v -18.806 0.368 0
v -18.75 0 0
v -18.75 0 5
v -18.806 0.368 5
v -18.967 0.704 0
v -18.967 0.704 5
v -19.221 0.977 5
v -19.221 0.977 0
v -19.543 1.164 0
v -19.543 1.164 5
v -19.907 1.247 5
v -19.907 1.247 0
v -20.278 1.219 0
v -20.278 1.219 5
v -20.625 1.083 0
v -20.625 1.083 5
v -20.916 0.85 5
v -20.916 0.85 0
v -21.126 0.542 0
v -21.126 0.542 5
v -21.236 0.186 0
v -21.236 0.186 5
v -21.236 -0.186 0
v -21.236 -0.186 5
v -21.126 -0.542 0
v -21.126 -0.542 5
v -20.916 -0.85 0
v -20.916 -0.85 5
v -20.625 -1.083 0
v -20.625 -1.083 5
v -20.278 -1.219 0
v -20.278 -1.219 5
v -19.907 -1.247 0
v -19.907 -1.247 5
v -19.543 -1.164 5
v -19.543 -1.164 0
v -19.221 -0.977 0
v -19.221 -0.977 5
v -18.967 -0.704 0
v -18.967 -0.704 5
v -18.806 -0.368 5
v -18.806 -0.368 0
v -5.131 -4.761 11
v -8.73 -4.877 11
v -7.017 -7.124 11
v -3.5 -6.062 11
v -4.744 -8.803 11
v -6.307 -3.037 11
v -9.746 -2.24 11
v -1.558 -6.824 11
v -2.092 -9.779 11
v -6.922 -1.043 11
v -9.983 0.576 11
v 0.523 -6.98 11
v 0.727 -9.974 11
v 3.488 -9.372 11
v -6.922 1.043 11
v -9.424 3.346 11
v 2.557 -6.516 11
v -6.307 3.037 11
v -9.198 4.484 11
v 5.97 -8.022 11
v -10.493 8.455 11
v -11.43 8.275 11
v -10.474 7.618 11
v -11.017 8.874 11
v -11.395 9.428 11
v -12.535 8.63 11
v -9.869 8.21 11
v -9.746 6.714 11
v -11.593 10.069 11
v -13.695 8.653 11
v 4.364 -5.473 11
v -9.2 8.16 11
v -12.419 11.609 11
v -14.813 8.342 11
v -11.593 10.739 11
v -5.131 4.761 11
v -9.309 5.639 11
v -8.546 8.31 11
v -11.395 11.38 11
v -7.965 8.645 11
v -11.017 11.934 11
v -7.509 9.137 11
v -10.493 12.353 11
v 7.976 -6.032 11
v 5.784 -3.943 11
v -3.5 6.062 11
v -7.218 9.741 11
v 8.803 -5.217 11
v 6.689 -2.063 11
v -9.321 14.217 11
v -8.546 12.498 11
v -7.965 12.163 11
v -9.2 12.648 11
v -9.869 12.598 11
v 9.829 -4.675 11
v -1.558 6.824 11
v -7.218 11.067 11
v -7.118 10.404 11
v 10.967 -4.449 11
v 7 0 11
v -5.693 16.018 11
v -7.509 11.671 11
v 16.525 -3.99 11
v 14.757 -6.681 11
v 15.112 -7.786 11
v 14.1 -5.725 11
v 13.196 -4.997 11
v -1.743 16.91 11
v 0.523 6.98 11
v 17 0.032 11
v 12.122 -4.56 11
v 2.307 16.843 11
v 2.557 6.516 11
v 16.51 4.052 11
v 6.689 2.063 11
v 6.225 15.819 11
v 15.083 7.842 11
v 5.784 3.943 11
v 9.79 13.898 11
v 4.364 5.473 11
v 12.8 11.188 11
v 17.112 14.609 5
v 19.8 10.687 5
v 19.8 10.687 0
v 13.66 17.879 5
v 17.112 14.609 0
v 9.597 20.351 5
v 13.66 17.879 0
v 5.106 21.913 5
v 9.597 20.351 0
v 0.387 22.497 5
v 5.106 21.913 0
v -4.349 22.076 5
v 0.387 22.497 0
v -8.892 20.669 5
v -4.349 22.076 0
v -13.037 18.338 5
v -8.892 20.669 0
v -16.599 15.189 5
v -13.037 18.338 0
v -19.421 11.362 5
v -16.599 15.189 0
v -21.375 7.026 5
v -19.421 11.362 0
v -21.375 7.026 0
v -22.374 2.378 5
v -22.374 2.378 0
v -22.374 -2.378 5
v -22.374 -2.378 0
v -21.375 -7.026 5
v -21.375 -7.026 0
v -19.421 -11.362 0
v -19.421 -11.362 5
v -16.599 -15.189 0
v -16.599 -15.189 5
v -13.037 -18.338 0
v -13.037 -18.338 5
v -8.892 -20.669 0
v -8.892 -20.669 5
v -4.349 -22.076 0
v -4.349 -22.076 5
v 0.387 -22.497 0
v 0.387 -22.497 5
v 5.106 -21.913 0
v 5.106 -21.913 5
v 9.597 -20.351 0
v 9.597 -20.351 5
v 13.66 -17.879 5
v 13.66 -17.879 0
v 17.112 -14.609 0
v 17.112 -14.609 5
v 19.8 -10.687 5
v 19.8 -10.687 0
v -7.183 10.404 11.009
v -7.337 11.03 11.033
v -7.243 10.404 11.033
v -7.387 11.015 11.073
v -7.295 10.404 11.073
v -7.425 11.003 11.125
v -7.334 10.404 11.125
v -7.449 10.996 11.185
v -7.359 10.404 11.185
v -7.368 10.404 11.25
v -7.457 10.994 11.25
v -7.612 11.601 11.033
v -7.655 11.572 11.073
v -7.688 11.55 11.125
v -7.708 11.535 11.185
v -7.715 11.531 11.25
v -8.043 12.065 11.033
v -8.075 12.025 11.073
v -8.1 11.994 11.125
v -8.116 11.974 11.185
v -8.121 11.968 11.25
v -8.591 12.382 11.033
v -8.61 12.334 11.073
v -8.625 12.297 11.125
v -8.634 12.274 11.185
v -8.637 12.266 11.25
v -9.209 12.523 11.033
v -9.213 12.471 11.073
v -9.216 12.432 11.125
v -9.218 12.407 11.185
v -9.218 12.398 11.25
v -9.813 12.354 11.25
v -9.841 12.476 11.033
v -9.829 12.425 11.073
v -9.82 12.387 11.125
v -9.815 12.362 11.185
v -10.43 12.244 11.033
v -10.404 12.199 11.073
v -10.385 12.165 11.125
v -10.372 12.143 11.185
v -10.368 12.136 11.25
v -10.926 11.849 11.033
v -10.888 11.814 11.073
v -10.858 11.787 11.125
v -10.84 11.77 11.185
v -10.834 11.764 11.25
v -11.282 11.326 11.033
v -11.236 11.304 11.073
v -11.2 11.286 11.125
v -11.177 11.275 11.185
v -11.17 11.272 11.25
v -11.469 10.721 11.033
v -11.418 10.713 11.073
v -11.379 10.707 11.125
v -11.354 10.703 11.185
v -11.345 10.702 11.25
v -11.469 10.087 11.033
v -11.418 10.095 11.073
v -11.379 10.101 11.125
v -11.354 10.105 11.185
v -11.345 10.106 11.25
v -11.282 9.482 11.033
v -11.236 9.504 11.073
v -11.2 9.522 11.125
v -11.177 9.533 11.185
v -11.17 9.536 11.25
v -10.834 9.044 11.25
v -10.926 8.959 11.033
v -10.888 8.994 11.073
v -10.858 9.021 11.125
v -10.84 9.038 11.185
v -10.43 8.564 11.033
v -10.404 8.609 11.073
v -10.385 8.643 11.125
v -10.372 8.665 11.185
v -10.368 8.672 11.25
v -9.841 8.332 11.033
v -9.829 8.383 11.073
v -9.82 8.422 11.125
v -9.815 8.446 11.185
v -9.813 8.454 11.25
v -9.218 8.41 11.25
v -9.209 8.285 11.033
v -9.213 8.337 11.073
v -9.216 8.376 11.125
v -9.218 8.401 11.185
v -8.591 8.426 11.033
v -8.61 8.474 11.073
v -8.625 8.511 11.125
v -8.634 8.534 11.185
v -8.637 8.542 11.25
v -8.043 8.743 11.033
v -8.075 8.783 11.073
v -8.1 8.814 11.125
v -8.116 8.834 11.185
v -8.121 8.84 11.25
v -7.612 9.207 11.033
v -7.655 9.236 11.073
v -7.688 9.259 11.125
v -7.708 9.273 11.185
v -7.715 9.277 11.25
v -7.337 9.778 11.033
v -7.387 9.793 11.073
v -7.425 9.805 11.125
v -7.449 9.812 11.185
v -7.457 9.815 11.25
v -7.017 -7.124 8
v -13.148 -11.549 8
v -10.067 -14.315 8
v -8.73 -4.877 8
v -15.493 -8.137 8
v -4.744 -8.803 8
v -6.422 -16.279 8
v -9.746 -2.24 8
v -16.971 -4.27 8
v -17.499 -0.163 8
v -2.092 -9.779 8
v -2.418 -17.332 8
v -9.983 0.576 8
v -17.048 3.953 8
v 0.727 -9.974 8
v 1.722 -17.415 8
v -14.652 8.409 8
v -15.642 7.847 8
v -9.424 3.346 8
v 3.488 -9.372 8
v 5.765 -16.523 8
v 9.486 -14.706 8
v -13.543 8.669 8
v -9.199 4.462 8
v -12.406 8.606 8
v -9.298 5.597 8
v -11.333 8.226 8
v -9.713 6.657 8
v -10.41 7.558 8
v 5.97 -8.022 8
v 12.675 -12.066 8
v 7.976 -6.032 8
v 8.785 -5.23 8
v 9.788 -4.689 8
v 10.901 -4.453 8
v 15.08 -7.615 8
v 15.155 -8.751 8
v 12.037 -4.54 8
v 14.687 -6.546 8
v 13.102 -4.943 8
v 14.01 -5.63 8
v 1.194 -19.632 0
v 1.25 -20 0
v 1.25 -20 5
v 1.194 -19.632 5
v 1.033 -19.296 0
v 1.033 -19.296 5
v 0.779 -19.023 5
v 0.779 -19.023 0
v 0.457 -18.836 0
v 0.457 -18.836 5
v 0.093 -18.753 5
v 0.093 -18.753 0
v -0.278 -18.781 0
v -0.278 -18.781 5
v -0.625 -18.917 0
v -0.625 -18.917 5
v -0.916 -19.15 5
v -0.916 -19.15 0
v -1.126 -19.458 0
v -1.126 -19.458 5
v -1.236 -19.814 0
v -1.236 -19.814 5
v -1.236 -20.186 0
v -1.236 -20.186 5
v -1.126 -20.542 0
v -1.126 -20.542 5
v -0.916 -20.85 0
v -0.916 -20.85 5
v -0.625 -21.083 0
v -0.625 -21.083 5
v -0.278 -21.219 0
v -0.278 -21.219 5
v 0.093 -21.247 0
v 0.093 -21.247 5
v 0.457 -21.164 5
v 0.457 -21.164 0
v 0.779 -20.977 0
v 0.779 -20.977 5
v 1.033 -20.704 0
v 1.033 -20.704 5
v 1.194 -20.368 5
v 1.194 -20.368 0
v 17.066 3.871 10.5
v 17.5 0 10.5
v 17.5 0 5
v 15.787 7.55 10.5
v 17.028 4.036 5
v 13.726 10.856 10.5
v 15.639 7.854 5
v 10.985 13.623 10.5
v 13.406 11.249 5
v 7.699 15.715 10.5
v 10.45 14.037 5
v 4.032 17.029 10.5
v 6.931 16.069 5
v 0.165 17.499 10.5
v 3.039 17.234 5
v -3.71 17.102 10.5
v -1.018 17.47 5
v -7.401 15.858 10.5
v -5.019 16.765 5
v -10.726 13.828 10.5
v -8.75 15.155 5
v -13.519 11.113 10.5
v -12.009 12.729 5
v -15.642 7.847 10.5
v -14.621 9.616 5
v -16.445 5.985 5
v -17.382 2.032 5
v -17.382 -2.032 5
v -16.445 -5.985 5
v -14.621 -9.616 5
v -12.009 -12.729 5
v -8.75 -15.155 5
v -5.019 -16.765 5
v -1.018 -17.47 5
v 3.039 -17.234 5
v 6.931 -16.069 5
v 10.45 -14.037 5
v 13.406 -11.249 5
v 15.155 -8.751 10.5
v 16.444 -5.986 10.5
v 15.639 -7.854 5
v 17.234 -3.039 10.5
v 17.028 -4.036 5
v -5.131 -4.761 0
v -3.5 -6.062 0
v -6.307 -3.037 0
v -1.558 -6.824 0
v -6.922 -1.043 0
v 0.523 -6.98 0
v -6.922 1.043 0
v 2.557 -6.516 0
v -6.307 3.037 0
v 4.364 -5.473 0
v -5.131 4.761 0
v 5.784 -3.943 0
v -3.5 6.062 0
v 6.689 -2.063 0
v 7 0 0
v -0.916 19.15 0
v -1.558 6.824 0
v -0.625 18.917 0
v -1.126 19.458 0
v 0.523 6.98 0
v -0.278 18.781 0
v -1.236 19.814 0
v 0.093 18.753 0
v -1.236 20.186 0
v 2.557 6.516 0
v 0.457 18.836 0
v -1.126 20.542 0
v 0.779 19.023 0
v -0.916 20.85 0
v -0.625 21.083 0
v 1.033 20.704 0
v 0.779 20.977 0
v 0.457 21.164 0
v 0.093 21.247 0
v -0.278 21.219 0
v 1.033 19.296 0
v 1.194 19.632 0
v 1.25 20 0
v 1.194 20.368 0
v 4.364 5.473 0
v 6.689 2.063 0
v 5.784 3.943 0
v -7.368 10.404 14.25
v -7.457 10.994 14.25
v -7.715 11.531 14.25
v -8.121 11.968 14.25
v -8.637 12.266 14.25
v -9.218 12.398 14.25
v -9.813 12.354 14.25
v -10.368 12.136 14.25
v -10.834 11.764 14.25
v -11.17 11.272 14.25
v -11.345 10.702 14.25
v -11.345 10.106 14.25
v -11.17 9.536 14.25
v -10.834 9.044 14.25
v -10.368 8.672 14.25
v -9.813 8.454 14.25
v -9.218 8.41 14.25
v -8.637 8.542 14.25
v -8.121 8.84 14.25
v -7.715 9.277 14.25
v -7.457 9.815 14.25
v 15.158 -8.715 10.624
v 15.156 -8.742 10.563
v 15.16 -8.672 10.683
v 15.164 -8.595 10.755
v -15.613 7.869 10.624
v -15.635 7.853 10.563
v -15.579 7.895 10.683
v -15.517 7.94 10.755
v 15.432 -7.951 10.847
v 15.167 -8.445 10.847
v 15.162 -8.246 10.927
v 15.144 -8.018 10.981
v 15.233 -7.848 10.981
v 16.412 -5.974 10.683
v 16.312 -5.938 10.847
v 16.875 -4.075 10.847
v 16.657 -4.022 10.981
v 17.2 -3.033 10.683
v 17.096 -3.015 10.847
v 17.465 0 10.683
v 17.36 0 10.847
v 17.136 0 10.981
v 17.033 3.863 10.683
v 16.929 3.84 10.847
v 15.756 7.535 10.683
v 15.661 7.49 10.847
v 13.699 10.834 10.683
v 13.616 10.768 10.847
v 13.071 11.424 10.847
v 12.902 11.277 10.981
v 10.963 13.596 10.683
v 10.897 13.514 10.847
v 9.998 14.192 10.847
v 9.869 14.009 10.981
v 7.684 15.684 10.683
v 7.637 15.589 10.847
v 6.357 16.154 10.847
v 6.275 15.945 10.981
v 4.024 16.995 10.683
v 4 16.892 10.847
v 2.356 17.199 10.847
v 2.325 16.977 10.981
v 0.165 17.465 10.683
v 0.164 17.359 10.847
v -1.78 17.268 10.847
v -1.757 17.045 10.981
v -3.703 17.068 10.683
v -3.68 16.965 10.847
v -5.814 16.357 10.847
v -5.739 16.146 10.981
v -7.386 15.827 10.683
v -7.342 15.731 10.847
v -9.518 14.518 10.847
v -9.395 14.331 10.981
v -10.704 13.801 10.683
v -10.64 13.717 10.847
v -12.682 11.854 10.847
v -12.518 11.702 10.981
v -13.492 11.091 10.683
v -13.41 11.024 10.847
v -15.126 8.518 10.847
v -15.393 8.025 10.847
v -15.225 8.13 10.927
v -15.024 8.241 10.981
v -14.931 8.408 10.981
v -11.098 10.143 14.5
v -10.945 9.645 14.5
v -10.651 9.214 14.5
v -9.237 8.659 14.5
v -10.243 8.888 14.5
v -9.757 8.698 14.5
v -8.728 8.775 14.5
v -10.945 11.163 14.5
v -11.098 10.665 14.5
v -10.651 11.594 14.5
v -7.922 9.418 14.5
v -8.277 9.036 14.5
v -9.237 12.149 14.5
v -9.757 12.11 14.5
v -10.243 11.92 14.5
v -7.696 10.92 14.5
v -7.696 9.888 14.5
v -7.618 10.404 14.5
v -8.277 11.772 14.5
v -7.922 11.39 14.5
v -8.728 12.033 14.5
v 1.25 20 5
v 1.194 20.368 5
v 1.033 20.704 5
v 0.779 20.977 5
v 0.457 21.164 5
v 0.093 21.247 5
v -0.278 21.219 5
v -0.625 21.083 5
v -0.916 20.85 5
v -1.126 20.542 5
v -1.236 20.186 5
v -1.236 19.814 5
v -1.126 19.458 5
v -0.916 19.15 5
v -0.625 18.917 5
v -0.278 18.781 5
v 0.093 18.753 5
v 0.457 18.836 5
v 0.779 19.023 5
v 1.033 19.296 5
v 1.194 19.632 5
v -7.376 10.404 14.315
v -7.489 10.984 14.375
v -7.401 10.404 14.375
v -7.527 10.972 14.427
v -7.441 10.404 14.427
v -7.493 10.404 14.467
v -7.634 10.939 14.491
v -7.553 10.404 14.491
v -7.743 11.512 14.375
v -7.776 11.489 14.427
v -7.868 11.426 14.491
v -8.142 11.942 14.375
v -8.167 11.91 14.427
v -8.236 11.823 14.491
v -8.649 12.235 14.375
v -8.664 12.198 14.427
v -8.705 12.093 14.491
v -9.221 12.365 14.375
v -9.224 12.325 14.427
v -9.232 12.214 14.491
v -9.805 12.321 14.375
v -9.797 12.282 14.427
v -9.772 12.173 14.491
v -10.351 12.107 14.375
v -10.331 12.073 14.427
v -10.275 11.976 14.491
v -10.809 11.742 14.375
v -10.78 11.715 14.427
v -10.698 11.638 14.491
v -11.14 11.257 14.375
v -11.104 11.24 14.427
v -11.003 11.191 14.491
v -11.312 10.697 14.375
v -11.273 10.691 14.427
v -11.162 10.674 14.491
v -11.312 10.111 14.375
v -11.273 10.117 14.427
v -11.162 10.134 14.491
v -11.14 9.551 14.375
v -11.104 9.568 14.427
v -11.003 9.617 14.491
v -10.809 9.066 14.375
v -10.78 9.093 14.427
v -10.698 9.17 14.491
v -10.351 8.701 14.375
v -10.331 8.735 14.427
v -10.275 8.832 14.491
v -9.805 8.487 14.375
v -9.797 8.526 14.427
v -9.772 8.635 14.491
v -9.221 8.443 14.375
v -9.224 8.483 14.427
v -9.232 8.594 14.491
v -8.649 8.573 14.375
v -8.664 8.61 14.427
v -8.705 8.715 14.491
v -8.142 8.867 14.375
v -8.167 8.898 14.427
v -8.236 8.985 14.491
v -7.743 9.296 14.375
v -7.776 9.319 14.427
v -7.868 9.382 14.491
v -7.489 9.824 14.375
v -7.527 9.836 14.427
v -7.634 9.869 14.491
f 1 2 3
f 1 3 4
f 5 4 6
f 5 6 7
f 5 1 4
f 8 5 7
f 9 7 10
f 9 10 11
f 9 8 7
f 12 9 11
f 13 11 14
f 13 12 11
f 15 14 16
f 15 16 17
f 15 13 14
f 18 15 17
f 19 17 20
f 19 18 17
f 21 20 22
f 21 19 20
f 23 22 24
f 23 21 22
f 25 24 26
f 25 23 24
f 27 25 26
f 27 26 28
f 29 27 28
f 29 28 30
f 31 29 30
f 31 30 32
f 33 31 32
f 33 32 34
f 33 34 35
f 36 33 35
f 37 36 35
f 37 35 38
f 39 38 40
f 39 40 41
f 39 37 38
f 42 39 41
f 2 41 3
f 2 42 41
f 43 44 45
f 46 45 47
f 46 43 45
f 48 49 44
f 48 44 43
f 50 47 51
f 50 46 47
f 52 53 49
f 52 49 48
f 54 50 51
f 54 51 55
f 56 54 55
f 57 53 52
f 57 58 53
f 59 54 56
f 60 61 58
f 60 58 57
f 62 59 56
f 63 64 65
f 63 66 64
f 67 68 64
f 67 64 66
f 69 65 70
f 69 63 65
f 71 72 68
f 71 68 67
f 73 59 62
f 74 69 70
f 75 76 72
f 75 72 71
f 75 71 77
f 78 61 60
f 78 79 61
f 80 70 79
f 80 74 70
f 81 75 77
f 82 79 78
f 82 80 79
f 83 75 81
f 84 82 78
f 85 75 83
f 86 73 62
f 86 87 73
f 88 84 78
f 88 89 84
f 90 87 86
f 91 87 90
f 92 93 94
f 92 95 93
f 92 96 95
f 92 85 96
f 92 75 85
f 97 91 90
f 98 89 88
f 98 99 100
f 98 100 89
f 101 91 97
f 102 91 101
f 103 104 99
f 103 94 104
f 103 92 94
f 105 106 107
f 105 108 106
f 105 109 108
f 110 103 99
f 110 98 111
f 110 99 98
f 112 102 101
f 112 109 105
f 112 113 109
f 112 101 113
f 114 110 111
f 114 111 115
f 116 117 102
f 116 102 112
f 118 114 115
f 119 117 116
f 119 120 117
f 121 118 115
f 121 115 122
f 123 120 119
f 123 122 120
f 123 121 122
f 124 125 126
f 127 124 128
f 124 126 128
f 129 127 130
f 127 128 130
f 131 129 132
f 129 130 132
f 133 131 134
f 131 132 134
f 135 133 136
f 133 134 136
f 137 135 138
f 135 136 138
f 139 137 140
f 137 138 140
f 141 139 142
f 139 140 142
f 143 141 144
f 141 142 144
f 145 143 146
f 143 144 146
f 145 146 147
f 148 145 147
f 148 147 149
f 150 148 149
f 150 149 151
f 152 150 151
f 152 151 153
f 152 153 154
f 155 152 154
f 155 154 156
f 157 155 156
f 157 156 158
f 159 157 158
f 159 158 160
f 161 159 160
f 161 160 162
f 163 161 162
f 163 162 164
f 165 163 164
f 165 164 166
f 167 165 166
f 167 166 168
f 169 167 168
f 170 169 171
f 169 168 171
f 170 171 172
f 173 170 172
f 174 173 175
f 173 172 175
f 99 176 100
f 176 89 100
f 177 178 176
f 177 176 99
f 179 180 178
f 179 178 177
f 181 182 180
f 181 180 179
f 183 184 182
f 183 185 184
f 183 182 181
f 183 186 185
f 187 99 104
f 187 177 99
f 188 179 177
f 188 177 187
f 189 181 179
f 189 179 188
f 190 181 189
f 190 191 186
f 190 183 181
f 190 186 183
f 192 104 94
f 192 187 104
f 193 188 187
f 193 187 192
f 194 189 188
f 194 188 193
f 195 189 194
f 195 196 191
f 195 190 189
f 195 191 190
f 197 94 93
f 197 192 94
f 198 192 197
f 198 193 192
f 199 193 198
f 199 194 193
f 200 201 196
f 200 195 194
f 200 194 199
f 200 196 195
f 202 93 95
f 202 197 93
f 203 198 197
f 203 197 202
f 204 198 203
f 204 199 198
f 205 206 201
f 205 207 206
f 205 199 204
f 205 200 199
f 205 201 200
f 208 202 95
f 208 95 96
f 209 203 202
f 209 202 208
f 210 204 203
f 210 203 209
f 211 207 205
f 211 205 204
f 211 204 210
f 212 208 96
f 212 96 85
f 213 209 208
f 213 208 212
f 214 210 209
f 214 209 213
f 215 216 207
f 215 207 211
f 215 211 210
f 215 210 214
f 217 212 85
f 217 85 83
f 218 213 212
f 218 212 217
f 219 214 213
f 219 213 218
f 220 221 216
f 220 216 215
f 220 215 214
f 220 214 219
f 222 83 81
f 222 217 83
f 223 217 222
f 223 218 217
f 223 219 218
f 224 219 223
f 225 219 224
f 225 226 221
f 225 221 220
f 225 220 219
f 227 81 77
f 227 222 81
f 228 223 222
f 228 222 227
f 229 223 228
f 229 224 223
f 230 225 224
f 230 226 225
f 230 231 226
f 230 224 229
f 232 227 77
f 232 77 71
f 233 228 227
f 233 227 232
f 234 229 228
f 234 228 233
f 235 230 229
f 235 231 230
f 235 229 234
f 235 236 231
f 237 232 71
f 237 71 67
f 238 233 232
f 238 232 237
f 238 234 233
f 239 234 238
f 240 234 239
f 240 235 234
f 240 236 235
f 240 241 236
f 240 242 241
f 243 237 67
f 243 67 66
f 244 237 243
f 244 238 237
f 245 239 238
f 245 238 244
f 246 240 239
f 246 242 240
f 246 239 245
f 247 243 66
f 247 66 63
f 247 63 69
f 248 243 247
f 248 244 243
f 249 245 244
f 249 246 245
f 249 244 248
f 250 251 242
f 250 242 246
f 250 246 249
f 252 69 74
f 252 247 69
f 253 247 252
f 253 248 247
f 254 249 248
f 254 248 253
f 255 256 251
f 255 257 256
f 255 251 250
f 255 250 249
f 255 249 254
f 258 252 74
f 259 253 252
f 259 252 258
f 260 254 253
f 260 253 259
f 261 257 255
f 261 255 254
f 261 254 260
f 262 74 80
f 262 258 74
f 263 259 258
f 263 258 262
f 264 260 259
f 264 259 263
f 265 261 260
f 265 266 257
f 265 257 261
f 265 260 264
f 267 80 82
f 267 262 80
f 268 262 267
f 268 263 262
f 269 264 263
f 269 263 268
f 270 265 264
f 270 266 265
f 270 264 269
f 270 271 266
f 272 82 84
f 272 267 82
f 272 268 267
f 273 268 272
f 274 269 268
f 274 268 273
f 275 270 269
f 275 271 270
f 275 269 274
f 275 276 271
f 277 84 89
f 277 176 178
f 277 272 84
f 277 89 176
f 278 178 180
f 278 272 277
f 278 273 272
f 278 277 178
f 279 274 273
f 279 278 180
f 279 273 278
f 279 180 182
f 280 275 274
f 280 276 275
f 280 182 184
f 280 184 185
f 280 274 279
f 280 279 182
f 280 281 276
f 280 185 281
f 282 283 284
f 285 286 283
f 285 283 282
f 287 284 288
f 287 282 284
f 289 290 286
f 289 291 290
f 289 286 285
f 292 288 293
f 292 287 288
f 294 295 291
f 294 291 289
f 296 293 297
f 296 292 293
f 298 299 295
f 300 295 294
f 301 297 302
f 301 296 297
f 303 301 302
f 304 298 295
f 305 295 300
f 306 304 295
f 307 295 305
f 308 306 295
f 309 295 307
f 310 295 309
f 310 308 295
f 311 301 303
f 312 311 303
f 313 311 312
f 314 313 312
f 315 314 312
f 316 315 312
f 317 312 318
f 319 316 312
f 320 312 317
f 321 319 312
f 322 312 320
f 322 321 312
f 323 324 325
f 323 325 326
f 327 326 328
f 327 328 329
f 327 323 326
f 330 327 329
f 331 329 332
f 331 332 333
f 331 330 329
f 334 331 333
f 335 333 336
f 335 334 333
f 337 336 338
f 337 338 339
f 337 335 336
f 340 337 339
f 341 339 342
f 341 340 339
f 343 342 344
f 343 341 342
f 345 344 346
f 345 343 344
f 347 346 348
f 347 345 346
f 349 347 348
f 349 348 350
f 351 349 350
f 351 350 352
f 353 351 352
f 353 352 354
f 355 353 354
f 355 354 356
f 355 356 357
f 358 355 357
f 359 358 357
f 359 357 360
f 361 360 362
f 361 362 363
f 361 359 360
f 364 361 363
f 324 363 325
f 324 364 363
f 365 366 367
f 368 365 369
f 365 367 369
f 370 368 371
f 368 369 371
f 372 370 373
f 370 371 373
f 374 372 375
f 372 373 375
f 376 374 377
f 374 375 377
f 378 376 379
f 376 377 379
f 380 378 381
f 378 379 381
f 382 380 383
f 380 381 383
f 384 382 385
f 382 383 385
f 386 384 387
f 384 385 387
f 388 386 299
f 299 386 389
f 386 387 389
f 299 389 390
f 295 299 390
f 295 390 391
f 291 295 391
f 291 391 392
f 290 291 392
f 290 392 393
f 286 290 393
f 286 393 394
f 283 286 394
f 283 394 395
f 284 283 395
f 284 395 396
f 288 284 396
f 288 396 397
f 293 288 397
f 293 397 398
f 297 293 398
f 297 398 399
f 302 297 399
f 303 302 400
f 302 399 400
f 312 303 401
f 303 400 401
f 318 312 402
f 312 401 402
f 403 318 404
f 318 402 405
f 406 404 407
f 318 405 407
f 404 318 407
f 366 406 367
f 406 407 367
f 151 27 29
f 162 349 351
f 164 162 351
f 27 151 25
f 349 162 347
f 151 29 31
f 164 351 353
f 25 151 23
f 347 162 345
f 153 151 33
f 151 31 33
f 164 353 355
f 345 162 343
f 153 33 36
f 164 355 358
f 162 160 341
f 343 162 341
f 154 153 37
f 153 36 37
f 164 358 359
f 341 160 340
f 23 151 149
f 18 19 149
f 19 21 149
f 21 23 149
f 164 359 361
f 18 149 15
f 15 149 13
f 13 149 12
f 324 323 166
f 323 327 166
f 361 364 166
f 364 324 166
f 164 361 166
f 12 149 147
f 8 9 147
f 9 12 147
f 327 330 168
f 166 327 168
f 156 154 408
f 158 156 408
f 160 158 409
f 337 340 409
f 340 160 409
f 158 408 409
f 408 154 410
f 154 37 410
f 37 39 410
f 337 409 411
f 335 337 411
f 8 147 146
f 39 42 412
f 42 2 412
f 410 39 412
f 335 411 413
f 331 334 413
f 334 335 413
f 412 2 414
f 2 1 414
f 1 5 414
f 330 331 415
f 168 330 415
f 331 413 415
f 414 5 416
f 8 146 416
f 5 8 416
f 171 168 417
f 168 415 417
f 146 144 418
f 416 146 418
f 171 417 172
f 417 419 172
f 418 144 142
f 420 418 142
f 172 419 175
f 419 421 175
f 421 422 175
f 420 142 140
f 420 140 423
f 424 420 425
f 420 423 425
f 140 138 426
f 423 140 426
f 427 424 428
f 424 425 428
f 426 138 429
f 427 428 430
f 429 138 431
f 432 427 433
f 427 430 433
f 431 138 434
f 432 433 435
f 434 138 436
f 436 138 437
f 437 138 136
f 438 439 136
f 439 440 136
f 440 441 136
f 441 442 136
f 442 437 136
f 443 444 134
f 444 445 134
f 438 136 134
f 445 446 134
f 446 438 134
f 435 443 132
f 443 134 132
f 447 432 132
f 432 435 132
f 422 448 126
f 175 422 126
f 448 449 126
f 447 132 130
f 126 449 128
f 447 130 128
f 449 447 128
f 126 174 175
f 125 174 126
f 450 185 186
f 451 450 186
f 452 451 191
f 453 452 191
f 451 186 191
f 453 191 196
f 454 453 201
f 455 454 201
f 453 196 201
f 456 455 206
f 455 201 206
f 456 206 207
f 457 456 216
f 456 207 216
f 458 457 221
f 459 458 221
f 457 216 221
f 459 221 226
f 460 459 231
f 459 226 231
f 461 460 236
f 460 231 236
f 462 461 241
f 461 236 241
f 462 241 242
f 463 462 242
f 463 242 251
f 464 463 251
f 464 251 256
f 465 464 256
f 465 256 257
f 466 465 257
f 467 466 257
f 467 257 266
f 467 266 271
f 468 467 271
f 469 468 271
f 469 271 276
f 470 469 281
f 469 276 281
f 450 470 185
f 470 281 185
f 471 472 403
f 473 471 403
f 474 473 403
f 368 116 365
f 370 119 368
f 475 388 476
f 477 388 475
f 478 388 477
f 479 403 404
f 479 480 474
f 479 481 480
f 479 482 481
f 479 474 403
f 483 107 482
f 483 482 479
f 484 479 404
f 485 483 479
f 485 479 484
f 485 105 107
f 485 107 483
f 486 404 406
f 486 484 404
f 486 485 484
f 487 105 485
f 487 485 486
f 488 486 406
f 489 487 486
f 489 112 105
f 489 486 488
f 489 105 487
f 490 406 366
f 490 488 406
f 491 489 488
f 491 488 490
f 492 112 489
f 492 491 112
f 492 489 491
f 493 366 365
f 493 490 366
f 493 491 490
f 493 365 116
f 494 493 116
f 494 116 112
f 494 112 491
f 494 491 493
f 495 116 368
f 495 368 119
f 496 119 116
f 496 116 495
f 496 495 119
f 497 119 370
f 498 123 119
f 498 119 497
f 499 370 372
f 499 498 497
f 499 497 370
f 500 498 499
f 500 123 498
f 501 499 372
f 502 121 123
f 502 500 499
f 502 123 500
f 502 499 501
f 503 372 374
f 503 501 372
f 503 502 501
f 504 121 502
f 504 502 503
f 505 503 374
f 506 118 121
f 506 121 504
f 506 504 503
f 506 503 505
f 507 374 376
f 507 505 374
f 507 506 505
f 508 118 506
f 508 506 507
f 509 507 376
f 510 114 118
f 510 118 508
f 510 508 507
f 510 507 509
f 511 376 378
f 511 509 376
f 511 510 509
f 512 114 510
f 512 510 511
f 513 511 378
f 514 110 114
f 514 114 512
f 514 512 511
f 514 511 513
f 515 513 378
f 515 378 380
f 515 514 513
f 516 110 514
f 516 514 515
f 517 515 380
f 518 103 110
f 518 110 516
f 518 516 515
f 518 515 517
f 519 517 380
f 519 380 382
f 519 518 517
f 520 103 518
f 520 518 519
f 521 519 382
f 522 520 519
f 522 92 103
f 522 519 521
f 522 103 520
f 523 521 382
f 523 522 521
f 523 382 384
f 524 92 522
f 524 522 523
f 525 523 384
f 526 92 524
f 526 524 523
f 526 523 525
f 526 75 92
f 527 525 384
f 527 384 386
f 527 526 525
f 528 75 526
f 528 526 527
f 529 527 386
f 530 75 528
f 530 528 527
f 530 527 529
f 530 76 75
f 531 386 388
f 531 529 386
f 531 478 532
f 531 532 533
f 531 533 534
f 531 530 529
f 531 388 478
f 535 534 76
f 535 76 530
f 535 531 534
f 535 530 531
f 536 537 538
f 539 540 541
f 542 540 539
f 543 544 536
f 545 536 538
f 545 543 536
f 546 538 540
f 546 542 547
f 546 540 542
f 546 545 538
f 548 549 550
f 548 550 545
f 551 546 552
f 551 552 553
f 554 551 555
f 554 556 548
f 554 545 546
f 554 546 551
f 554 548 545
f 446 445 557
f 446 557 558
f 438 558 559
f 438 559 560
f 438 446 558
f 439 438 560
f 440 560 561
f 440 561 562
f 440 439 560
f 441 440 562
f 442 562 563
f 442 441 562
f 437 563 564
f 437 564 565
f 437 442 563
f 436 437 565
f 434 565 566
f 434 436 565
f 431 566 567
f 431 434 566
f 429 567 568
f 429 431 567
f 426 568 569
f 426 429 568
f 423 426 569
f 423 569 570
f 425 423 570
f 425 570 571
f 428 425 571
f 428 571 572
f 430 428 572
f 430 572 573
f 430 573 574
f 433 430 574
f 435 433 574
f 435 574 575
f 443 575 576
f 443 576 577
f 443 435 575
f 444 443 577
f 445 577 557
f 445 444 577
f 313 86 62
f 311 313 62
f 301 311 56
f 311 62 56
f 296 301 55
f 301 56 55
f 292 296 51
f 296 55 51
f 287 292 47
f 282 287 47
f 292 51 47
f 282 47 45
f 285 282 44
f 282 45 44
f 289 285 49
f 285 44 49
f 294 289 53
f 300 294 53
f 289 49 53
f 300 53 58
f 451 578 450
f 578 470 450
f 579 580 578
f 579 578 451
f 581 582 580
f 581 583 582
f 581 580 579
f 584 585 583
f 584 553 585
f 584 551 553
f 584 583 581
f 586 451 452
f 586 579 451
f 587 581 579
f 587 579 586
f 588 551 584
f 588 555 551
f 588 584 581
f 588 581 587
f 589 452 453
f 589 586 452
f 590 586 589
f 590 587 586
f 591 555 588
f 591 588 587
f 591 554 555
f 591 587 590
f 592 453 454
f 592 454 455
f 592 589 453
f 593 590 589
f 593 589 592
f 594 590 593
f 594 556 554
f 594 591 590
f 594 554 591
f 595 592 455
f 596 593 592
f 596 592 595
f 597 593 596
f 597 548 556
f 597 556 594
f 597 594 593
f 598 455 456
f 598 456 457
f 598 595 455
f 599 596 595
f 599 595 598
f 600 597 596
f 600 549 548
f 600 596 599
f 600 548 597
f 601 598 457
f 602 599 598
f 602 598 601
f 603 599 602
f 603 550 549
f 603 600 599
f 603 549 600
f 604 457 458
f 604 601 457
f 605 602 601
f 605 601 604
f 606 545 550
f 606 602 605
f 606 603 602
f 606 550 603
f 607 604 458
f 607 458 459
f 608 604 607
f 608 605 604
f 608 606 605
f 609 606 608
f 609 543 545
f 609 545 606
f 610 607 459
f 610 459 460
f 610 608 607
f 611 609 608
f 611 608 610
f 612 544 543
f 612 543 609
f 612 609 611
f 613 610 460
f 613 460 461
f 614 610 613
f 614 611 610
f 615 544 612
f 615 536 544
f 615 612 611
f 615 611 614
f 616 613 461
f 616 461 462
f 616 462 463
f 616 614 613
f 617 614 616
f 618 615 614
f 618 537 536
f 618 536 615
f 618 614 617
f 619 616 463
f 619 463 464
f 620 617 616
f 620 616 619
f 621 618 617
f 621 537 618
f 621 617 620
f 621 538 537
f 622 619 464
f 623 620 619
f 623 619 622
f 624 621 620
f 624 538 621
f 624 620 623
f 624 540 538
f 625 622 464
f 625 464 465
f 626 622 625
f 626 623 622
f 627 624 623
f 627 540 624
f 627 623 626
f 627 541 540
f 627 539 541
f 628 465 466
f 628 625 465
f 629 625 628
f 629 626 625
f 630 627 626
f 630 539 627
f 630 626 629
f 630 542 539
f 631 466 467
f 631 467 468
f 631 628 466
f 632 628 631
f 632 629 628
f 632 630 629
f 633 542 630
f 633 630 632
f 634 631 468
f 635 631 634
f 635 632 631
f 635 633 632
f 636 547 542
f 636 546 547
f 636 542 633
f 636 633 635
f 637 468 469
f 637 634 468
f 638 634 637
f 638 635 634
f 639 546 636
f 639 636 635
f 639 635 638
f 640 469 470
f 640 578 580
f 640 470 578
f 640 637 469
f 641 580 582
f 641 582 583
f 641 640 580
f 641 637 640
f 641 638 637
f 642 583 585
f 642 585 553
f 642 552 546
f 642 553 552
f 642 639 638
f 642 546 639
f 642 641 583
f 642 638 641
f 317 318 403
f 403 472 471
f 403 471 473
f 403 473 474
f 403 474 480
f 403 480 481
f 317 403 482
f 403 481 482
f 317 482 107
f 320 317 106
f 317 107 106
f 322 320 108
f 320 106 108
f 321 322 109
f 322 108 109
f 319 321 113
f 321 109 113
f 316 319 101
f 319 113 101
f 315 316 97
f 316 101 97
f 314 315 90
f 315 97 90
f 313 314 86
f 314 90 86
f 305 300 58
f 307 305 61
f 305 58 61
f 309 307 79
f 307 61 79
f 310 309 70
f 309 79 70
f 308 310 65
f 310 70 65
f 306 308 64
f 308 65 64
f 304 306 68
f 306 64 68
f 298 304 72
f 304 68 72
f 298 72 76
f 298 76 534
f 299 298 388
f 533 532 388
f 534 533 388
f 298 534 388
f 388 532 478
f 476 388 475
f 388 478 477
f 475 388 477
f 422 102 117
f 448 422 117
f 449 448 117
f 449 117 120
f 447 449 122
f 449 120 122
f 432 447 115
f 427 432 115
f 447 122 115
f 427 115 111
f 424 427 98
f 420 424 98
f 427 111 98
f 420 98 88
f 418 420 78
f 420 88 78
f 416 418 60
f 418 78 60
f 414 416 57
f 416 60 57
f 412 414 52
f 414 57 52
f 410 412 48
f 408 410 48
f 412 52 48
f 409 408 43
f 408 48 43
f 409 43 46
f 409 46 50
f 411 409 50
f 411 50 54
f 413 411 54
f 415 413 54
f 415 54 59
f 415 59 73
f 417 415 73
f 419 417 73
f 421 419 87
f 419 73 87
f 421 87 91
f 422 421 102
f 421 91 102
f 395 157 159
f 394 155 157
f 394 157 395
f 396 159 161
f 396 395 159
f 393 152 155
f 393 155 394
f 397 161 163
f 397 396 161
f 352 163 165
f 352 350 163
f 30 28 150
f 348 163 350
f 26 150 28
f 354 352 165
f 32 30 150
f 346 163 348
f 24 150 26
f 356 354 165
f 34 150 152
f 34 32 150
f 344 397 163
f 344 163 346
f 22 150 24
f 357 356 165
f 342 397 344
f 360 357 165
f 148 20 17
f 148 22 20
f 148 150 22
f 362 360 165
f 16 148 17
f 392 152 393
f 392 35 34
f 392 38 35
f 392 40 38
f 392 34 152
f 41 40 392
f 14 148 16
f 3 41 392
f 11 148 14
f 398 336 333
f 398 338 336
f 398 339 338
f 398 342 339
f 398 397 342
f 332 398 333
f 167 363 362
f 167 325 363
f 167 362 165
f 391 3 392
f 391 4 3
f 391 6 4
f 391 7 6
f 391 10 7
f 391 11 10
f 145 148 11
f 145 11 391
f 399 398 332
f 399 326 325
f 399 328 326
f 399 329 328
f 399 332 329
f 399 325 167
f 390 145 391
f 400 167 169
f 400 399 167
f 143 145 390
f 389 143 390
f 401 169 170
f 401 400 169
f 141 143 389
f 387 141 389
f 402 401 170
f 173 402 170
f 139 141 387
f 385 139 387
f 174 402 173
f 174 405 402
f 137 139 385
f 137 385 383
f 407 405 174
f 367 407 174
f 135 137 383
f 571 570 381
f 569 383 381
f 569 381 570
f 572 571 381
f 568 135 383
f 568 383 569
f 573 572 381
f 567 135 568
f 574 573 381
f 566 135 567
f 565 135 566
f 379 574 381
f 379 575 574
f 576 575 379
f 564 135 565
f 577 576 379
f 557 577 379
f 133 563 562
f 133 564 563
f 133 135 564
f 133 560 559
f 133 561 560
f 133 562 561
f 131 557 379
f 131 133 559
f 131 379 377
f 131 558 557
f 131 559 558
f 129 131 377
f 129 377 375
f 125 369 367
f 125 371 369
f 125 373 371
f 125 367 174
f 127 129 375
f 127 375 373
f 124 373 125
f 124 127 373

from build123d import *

# Parameters (mm, degrees)
SKETCH_1_R          = 22.5
SKETCH_1_R_2        = 1.25
EXTRUDE_1_DEPTH     = 5
SKETCH_2_R          = 17.5
EXTRUDE_2_DEPTH     = 6
SKETCH_3_R          = 2
EXTRUDE_3_DEPTH     = 3.5
FILLET_1_R          = 0.5
FILLET_2_R          = 0.25
CUT_EXTRUDE_1_DEPTH = 3
SKETCH_5_R          = 7
CUT_EXTRUDE_2_DEPTH = 11
SKETCH_6_W          = 10.283159463
SKETCH_6_H          = 33.988548121
CUT_EXTRUDE_3_DEPTH = 17


with BuildPart() as part:
    # 草图1 → 凸台-拉伸1 (new body)
    with BuildSketch(Plane.XY):
        Circle(SKETCH_1_R)
        with Locations((0, 20)):
            Circle(SKETCH_1_R_2, mode=Mode.SUBTRACT)
        with Locations((0, -20)):
            Circle(SKETCH_1_R_2, mode=Mode.SUBTRACT)
        with Locations((-20, 0)):
            Circle(SKETCH_1_R_2, mode=Mode.SUBTRACT)
    extrude(amount=EXTRUDE_1_DEPTH)

    # 草图2 → 凸台-拉伸2 (add)
    with BuildSketch(Plane.XY.offset(5)):
        Circle(SKETCH_2_R)
    extrude(amount=EXTRUDE_2_DEPTH)

    # 草图3 → 凸台-拉伸3 (add)
    with BuildSketch(Plane.XY.offset(11)):
        with Locations((-9.367828489, 10.404027557)):
            Circle(SKETCH_3_R)
    extrude(amount=EXTRUDE_3_DEPTH)

    # 圆角1
    fillet_1_edges = [part.edges().sort_by_distance(p)[0] for p in [
        (-17.5, 0, 11),
    ]]
    fillet(fillet_1_edges, radius=FILLET_1_R)

    # 圆角2
    fillet_2_edges = [part.edges().sort_by_distance(p)[0] for p in [
        (-11.367828489, 10.404027557, 11),
        (-11.367828489, 10.404027557, 14.5),
    ]]
    fillet(fillet_2_edges, radius=FILLET_2_R)

    # 草图4 → 切除-拉伸1 (cut)
    with BuildSketch(Plane.XY.offset(11)):
        with BuildLine():
            ThreePointArc((-16.962482908, 6.022804462), (-8.539705078, -15.845297005), (14.357267915, -10.856742514))
            ThreePointArc((14.357267915, -10.856742514), (13.579373382, -5.253629085), (7.976259953, -6.031523619))
            ThreePointArc((7.976259953, -6.031523619), (-4.744280599, -8.802942781), (-9.423601616, 3.346002479))
            ThreePointArc((-9.423601616, 3.346002479), (-11.85464127, 8.453844117), (-16.962482908, 6.022804462))
        make_face()
    extrude(amount=-CUT_EXTRUDE_1_DEPTH, mode=Mode.SUBTRACT)

    # 草图5 → 切除-拉伸2 (cut)
    with BuildSketch(Plane.XY.offset(11)):
        Circle(SKETCH_5_R)
    extrude(amount=-CUT_EXTRUDE_2_DEPTH, mode=Mode.SUBTRACT)

    # 草图6 → 切除-拉伸3 (cut)
    with BuildSketch(Plane.XY.offset(5)):
        with Locations((24.941579731, -0.947133109)):
            Rectangle(SKETCH_6_W, SKETCH_6_H)
    extrude(amount=-CUT_EXTRUDE_3_DEPTH, mode=Mode.SUBTRACT)


solid = part.part
